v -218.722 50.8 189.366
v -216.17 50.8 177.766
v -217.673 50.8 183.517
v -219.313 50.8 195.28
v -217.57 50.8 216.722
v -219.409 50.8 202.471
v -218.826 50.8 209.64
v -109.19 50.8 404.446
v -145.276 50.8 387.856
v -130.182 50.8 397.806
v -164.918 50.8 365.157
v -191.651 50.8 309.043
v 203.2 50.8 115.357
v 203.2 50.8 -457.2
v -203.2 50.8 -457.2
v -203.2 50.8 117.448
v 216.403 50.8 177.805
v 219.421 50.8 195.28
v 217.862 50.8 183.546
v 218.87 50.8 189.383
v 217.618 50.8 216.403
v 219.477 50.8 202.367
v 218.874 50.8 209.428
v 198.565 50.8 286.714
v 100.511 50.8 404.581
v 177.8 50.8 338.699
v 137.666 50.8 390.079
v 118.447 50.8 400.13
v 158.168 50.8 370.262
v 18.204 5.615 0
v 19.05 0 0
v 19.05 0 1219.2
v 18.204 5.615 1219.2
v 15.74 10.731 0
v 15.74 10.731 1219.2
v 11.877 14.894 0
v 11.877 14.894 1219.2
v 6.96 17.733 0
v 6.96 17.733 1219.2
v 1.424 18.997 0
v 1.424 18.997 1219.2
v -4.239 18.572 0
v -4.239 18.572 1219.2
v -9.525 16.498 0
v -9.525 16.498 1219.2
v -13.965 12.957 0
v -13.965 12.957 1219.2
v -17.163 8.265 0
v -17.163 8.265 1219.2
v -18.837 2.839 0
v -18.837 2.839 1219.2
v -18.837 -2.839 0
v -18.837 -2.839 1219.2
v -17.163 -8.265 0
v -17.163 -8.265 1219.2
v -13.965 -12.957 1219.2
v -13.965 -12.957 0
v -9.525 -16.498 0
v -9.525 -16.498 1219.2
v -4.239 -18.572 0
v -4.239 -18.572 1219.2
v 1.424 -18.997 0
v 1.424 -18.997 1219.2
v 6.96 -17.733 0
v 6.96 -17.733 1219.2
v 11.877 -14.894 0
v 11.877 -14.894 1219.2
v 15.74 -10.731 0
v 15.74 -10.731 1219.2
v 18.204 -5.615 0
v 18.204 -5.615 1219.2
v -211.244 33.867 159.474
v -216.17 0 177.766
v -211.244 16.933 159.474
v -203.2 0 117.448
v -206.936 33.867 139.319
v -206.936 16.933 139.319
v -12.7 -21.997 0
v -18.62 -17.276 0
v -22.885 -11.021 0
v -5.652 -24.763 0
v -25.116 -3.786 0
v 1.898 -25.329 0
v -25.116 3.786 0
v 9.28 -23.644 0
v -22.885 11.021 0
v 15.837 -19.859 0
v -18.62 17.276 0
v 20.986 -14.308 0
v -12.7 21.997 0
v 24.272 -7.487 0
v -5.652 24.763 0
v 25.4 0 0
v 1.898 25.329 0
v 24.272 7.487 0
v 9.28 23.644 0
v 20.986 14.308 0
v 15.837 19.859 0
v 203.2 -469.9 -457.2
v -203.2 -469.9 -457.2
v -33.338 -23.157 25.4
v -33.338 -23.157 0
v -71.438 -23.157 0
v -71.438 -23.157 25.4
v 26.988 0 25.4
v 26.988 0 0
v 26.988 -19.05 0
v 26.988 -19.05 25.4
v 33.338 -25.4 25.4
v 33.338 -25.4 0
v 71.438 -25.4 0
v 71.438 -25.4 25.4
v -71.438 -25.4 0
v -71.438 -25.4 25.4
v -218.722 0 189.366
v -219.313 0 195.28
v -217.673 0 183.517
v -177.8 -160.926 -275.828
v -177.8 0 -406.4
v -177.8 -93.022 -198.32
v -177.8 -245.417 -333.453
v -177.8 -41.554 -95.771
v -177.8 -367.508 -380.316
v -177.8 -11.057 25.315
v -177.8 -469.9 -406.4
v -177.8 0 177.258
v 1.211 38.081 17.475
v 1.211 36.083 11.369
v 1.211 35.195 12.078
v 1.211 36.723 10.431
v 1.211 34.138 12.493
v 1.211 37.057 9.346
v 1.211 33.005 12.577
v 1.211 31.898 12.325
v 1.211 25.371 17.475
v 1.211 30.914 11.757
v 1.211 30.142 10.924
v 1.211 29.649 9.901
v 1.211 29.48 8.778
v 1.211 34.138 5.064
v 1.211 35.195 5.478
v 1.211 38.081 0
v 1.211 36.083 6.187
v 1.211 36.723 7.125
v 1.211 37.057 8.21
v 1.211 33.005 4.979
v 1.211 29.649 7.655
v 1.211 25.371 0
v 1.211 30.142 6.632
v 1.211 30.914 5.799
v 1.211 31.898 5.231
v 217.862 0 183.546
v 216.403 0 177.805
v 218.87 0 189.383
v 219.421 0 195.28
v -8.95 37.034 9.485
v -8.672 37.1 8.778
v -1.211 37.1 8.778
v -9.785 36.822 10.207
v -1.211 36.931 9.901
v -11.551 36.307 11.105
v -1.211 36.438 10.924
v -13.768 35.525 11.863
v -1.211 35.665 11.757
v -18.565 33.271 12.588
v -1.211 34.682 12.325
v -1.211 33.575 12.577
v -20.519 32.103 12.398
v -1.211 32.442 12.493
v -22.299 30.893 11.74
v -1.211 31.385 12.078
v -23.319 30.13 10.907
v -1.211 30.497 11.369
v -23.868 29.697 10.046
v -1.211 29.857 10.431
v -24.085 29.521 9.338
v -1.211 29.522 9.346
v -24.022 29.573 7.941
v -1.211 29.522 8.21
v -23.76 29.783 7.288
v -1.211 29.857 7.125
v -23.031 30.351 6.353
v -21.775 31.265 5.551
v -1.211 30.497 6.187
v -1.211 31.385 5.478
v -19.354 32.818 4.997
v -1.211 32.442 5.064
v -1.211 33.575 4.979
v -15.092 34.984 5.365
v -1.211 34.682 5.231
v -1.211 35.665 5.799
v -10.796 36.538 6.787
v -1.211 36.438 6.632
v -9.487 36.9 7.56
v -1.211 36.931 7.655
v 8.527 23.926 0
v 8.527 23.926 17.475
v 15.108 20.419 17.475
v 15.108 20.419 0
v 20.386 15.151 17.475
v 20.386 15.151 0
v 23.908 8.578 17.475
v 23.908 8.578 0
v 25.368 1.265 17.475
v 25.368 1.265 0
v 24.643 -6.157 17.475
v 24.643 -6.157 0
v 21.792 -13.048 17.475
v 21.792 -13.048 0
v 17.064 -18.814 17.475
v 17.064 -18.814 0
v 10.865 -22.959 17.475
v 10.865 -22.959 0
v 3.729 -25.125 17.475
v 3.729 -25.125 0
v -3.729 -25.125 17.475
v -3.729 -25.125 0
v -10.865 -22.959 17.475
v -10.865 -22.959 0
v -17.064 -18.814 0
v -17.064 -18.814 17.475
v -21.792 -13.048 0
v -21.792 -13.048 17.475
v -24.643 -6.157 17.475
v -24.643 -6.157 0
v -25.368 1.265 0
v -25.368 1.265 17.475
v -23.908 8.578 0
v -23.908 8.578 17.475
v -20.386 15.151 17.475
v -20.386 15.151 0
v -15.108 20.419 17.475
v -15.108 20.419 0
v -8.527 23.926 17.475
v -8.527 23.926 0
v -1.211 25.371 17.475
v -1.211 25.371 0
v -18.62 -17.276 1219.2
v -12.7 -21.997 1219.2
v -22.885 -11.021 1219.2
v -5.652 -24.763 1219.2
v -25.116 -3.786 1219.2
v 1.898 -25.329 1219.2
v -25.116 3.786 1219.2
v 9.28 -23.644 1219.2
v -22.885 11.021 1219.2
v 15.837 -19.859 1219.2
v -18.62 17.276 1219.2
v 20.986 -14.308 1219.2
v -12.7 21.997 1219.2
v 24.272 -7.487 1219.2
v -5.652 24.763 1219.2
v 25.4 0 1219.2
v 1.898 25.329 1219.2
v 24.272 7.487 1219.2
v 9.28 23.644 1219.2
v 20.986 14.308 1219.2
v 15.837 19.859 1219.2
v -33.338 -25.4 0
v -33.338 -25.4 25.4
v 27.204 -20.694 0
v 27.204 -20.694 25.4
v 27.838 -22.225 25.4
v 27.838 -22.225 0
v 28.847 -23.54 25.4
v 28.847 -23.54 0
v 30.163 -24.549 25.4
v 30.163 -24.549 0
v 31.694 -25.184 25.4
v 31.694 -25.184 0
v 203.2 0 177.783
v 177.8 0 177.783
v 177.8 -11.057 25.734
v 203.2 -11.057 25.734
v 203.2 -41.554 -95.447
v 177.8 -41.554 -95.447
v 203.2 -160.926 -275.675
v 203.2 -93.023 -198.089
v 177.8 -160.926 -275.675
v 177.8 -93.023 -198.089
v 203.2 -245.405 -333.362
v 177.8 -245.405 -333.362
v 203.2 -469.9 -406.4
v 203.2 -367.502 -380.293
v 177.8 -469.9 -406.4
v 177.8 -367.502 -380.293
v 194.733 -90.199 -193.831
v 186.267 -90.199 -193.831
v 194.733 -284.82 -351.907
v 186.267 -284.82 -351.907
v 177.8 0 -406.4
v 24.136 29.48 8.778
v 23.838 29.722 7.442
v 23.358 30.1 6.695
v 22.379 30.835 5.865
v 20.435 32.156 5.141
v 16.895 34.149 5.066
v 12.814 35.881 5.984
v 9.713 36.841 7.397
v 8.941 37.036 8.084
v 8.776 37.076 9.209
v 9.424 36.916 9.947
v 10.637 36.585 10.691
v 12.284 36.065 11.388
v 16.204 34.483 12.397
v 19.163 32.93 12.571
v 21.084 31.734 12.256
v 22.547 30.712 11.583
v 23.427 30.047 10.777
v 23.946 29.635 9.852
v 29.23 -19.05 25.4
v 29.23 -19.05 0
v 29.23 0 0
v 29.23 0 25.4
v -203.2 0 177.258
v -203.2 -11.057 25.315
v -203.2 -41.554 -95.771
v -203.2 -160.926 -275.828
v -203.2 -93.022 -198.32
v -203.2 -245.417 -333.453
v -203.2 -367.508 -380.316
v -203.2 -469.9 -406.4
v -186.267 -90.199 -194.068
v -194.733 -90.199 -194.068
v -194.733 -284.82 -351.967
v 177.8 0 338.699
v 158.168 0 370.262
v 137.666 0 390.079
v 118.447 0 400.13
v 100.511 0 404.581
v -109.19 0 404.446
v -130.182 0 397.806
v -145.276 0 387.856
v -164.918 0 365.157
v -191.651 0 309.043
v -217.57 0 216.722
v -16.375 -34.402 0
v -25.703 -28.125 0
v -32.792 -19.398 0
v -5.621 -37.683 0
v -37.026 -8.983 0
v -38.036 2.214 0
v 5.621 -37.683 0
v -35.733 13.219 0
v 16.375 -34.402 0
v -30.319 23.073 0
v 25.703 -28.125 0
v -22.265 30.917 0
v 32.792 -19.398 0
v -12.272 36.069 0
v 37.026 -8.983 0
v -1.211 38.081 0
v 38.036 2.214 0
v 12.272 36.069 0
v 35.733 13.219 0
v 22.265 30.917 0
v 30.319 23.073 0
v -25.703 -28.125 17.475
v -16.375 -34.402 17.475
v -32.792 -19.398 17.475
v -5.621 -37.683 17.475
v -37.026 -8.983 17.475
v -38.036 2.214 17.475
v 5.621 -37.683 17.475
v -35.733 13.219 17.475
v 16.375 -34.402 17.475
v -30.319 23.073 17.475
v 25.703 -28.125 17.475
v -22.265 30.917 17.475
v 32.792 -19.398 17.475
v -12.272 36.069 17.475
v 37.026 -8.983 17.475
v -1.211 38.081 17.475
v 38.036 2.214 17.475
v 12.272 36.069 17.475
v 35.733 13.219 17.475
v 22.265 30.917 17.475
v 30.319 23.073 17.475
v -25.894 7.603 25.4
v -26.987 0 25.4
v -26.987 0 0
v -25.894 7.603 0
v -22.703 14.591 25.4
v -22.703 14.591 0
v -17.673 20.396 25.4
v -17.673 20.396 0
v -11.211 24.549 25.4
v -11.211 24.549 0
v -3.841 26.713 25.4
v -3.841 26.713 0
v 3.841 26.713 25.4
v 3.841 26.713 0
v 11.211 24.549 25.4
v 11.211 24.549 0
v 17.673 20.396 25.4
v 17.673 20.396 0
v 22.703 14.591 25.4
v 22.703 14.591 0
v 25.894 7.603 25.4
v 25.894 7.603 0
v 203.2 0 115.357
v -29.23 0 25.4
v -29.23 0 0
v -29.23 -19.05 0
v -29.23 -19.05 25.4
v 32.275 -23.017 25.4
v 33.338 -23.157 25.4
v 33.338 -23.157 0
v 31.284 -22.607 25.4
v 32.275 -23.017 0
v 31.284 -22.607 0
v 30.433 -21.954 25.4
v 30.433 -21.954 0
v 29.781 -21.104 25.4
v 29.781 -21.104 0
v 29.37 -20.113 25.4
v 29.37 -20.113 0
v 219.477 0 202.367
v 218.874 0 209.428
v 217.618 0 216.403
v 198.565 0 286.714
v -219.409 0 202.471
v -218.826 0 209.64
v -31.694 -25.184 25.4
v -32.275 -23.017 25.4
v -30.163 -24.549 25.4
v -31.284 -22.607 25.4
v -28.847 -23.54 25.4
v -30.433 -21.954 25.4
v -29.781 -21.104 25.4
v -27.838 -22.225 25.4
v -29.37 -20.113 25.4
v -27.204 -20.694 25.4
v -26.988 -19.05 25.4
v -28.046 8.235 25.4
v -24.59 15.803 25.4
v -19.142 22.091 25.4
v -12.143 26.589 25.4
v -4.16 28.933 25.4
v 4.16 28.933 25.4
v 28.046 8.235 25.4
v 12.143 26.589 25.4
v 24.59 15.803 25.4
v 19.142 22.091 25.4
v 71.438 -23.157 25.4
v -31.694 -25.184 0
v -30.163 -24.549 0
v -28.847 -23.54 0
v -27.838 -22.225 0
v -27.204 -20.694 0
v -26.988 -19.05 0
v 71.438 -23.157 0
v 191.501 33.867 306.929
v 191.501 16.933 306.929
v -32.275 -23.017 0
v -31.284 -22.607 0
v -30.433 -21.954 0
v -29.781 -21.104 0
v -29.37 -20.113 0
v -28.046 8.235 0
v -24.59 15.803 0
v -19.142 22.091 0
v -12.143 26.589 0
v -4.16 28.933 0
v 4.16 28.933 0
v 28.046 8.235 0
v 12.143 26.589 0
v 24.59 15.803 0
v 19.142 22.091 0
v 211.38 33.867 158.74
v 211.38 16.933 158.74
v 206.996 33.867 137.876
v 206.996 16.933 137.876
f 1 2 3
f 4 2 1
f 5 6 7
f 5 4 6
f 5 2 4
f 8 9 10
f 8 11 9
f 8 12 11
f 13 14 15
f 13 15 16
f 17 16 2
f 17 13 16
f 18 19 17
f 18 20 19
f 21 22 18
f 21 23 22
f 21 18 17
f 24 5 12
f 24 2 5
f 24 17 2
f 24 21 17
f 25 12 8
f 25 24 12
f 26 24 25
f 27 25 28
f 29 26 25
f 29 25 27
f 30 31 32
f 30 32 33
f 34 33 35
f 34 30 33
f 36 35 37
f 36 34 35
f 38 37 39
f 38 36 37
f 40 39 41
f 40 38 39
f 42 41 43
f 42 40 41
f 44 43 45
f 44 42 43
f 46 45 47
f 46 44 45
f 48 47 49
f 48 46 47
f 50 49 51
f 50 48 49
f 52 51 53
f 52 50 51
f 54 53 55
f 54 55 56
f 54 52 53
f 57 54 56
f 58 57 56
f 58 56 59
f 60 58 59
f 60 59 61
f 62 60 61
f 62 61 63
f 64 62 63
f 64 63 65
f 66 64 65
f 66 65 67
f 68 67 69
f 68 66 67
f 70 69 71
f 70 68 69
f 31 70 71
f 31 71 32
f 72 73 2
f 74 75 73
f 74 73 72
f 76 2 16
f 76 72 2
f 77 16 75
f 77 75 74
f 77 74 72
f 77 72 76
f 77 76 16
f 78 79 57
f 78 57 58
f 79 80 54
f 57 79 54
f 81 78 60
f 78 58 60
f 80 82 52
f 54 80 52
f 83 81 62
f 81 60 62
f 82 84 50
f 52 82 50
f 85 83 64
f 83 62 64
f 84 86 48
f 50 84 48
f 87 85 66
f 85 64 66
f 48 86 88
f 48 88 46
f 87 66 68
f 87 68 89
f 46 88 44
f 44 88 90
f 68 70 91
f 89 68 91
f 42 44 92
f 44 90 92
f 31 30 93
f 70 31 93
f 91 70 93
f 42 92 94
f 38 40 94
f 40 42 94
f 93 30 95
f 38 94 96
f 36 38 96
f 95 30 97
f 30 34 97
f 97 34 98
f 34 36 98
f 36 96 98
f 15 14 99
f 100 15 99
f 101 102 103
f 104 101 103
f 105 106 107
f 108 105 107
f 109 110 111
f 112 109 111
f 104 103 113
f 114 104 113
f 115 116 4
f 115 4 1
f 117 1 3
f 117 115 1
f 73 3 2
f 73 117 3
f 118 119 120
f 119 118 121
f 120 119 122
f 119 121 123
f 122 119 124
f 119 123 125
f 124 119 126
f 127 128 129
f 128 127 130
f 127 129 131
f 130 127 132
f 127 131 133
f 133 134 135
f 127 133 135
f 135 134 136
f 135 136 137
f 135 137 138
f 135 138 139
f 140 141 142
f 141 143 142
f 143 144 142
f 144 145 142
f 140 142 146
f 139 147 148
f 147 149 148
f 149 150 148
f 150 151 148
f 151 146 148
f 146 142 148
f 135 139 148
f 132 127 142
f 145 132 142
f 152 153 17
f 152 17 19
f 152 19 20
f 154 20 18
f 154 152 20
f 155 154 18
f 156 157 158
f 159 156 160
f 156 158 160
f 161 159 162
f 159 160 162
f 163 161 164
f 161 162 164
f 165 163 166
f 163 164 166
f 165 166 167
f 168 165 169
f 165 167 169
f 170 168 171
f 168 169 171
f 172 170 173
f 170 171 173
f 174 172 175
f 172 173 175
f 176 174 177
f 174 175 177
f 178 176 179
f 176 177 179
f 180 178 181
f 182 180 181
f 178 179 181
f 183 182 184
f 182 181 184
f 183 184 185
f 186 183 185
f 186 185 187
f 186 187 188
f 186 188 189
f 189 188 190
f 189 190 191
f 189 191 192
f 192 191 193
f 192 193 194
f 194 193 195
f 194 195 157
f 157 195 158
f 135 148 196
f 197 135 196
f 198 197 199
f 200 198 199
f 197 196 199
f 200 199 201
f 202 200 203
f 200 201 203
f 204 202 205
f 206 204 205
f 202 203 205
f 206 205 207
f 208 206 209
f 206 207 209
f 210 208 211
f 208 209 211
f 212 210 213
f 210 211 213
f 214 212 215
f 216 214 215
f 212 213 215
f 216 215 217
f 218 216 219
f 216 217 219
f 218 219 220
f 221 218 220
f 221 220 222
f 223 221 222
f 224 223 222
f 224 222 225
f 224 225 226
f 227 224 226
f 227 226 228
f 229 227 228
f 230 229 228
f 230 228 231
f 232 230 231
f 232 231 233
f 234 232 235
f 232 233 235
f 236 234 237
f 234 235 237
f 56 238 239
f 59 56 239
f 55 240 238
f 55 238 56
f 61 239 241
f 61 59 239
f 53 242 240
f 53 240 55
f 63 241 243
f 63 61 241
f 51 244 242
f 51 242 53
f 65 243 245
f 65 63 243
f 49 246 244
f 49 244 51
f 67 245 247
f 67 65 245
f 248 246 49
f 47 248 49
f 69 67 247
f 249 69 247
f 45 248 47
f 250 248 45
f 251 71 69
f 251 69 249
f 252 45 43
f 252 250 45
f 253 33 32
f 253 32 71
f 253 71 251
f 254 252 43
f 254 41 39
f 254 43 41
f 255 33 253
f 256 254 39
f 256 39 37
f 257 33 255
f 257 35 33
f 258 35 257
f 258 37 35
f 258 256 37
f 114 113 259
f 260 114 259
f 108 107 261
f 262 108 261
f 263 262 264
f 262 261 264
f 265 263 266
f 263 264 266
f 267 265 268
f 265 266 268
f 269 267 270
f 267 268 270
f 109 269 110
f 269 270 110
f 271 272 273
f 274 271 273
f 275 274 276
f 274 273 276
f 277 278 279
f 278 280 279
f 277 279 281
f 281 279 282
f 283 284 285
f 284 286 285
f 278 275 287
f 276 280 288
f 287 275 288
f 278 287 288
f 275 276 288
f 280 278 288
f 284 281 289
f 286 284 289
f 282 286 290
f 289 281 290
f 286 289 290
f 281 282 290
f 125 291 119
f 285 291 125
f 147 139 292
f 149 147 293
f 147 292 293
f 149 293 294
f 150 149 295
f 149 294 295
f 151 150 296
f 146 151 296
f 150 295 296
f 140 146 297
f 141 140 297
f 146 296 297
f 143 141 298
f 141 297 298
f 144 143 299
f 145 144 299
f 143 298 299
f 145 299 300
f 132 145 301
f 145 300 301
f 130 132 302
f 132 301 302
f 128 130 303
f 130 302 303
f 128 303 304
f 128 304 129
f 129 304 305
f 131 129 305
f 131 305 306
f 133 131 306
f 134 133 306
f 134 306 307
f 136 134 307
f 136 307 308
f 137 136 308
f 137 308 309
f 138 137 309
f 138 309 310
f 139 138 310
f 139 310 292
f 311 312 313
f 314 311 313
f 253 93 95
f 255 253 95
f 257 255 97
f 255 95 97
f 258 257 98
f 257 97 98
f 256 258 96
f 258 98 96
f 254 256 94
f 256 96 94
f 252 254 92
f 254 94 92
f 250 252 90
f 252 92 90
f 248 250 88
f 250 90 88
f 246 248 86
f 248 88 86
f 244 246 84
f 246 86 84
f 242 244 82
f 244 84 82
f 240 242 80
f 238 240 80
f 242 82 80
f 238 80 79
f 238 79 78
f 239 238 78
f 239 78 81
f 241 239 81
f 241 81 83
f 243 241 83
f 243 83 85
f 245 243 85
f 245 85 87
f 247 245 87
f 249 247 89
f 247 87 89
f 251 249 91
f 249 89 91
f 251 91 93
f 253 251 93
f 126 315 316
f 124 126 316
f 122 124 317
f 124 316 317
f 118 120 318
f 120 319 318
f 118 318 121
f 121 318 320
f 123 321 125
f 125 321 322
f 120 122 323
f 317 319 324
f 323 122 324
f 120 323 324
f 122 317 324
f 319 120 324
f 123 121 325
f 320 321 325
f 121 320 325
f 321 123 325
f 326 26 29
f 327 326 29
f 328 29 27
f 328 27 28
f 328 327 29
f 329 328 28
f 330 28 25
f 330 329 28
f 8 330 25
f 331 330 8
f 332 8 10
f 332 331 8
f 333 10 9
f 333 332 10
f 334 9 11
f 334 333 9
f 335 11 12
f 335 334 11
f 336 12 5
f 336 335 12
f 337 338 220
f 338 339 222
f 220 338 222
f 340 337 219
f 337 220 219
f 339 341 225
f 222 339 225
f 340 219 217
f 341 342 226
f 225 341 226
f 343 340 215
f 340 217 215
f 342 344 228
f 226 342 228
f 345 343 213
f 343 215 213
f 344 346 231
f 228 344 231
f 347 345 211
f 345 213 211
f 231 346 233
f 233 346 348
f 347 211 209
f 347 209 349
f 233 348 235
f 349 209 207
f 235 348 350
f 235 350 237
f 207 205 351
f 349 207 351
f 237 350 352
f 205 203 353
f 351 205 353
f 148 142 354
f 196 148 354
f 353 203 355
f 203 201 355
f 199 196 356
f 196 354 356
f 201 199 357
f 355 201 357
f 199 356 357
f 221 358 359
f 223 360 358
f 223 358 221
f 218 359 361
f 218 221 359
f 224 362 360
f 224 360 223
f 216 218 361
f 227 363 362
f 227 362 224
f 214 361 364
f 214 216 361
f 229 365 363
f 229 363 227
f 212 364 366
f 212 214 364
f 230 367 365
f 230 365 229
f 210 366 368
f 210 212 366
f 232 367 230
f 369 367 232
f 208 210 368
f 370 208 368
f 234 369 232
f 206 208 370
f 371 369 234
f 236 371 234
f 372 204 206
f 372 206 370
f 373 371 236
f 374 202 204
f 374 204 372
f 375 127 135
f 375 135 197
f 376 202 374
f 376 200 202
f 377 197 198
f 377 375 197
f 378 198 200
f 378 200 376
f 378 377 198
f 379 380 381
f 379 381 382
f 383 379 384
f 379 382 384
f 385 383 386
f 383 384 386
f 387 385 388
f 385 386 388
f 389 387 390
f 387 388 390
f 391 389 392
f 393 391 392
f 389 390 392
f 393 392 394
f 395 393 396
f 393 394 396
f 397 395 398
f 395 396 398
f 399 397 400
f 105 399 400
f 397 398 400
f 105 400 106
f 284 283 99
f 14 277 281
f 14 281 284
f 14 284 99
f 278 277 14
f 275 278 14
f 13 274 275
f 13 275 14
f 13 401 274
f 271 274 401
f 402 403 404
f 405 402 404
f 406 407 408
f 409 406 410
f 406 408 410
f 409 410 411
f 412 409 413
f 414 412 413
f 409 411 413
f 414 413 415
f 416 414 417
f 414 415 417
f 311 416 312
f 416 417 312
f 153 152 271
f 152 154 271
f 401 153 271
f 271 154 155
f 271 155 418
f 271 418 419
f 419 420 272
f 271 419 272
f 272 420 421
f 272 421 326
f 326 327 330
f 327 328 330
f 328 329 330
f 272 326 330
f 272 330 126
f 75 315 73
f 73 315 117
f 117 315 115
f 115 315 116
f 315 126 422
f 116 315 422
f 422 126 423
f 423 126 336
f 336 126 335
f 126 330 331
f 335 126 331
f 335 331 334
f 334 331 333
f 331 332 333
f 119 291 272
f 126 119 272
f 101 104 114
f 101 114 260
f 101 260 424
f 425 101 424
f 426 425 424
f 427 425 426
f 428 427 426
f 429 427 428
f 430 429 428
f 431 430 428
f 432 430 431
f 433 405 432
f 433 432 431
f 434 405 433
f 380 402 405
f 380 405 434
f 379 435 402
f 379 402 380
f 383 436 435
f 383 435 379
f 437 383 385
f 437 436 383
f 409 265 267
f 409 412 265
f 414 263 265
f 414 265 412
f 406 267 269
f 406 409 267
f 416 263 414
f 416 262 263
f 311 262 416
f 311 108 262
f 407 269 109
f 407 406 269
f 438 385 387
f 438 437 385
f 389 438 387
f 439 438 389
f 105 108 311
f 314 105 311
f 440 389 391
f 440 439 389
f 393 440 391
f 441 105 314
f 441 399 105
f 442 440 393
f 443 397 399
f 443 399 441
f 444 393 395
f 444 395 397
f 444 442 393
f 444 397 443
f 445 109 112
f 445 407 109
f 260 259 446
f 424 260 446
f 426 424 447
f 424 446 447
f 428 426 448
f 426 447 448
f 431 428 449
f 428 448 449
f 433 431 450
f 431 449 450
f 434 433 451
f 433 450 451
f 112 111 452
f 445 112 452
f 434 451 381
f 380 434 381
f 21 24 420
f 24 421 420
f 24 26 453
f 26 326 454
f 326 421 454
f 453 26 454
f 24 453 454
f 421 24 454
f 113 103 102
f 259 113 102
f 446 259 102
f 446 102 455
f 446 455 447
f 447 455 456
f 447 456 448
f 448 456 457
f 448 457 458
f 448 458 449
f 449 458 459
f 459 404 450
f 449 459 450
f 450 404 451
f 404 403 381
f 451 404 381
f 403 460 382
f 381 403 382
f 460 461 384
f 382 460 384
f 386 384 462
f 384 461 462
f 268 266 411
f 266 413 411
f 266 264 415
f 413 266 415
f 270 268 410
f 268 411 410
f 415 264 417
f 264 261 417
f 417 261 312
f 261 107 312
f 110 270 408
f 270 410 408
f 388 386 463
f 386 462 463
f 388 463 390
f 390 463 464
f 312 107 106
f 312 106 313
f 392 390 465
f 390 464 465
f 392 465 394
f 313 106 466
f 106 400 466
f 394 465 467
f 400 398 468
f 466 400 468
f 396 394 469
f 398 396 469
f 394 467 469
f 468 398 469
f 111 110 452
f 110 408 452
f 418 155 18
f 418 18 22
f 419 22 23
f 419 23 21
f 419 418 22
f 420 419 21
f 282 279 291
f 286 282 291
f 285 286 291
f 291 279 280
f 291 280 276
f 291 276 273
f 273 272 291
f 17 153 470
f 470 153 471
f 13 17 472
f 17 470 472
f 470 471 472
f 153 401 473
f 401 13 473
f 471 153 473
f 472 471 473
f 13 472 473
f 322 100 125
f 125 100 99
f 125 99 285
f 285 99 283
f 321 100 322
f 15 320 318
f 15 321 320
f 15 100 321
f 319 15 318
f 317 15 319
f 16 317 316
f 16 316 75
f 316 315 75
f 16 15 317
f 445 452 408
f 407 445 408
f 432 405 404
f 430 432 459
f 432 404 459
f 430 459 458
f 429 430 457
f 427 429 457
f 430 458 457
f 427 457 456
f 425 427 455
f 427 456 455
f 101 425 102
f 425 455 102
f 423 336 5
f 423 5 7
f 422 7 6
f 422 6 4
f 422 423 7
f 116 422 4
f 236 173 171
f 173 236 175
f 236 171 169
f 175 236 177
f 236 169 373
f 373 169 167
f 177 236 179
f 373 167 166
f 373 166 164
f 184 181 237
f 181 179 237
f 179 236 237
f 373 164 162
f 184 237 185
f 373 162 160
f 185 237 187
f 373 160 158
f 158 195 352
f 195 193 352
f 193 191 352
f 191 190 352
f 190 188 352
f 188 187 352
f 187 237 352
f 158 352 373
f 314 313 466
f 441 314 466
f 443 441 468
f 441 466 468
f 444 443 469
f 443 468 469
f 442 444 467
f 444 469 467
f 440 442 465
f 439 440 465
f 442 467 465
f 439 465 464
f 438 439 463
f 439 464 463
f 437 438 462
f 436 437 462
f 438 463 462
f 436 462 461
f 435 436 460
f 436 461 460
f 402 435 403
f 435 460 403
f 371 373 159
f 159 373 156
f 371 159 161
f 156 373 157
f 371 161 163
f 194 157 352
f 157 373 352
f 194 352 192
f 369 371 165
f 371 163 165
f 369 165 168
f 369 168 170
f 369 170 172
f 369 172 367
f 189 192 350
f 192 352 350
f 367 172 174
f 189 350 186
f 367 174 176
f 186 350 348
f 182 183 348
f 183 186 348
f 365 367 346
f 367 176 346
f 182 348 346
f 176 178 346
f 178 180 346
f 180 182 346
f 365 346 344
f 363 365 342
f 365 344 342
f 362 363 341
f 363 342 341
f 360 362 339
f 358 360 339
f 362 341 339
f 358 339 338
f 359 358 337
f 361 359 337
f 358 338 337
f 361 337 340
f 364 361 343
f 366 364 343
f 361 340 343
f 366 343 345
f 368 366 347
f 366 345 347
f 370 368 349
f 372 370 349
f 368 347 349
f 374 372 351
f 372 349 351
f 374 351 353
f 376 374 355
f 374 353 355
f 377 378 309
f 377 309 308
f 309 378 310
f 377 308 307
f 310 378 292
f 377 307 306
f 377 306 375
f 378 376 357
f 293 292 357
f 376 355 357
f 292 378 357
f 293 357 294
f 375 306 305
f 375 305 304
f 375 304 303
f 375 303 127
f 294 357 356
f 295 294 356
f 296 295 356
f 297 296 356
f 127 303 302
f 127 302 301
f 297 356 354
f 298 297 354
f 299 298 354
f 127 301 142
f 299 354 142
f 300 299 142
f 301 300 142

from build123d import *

# Parameters (mm, degrees)
F0_R      = 25.4
F0_R_2    = 19.05
F1_DEPTH  = 1219.2
F2_DEPTH  = 25.4
F4_DEPTH  = 17.4752
F6_D      = 7.62
F6_DEPTH  = 38.101
F7_D      = 7.62
F8_W      = 355.6
F8_H      = 50.8
F9_DEPTH  = 50.8
F11_DEPTH = 469.9
F12_DEPTH = 25.4
F14_DEPTH = 25.4
F15_DEPTH = 25.4


with BuildPart() as f1:
    # F0 (on Top) → F1 (new body)
    with BuildSketch(Plane.XY):
        Circle(F0_R)
        Circle(F0_R_2, mode=Mode.SUBTRACT)
    extrude(amount=F1_DEPTH)


with BuildPart() as f2:
    # F0 (on Top) → F2 (new body)
    with BuildSketch(Plane.XY):
        with BuildLine():
            Line((-26.9875, -19.05), (-26.9875, 0))
            ThreePointArc((-26.9875, 0), (0, 26.9875), (26.9875, 0))
            Line((26.9875, 0), (26.9875, -19.05))
            ThreePointArc((26.9875, -19.05), (28.8473719395, -23.5401280605), (33.3375, -25.4))
            Line((33.3375, -25.4), (71.4375, -25.4))
            Line((71.4375, -25.4), (71.4375, -23.1570992619))
            Line((71.4375, -23.1570992619), (33.3375, -23.1570992619))
            ThreePointArc((33.3375, -23.1570992619), (30.4333422609, -21.9541577391), (29.2304007381, -19.05))
            Line((29.2304007381, -19.05), (29.2304007381, 0))
            ThreePointArc((29.2304007381, 0), (0, 29.2304007381), (-29.2304007381, 0))
            Line((-29.2304007381, 0), (-29.2304007381, -19.05))
            ThreePointArc((-29.2304007381, -19.05), (-30.4333422609, -21.9541577391), (-33.3375, -23.1570992619))
            Line((-33.3375, -23.1570992619), (-71.4375, -23.1570992619))
            Line((-71.4375, -23.1570992619), (-71.4375, -25.4))
            Line((-71.4375, -25.4), (-33.3375, -25.4))
            ThreePointArc((-33.3375, -25.4), (-28.8473719395, -23.5401280605), (-26.9875, -19.05))
        make_face()
    extrude(amount=F2_DEPTH)


with BuildPart() as f4:
    # F3 (on Top) → F4 (new body)
    with BuildSketch(Plane.XY):
        with BuildLine():
            Line((-1.210663635, 25.3711311053), (-1.210663635, 38.0807601495))
            ThreePointArc((-1.210663635, 38.0807601495), (0, -38.1), (1.210663635, 38.0807601495))
            Line((1.210663635, 38.0807601495), (1.210663635, 25.3711311053))
            ThreePointArc((1.210663635, 25.3711311053), (0, -25.4), (-1.210663635, 25.3711311053))
        make_face()
    extrude(amount=F4_DEPTH)

    # F6 (through all, one way)
    with BuildSketch(Plane.YZ):
        with Locations((33.2899410278, 8.7780257373)):
            Circle(F6_D / 2)
    extrude(amount=-F6_DEPTH, mode=Mode.SUBTRACT)

    # F7 (through all)
    with Locations(Plane(origin=(0, 0, 0), x_dir=(0, 1, 0), z_dir=(-1, 0, 0))):
        with Locations((33.2899410278, -8.7780257373)):
            Hole(F7_D / 2)


with BuildPart() as f9:
    # F8 (on Front) → F9 (new body)
    with BuildSketch(Plane.XZ):
        with BuildLine():
            add(Edge.make_bspline(
                [(-10.5840112569, 406.4), (14.3579992132, 406.4), (84.774969433, 406.4), (143.8927068177, 406.4), (177.8, 338.6991968772)],
                knots=[0.4890074401, 0.4890074401, 0.4890074401, 0.4890074401, 0.6309879631, 0.8835658569, 0.8835658569, 0.8835658569, 0.8835658569], degree=3))
            add(Edge.make_bspline(
                [(-177.8, 342.347117997), (-146.667200487, 406.4), (-96.3951234553, 406.4), (-32.4144817487, 406.4), (-10.5840112569, 406.4)],
                knots=[0.1196529721, 0.1196529721, 0.1196529721, 0.1196529721, 0.364739125, 0.4890074401, 0.4890074401, 0.4890074401, 0.4890074401], degree=3))
            Line((-177.8, 342.347117997), (-177.8, 195.2799856663))
            Line((-177.8, 195.2799856663), (0, 195.2799856663))
            Line((0, 195.2799856663), (177.8, 195.2799856663))
            Line((177.8, 195.2799856663), (177.8, 338.6991968772))
        make_face()
        with BuildLine():
            add(Edge.make_bspline(
                [(177.8, 338.6991968772), (191.7201419538, 310.905625011), (204.9767238239, 271.7018098175), (217.617713139, 216.4034432339)],
                knots=[0.8835658569, 0.8835658569, 0.8835658569, 0.8835658569, 0.987258007, 0.987258007, 0.987258007, 0.987258007], degree=3))
            Line((177.8, 338.6991968772), (177.8, 195.2799856663))
            Line((177.8, 195.2799856663), (219.4212105721, 195.2799856663))
            ThreePointArc((219.4212105721, 195.2799856663), (219.2576697661, 205.9047418246), (217.617713139, 216.4034432339))
        make_face()
        with BuildLine():
            Line((-177.8, 195.2799856663), (-177.8, 342.347117997))
            add(Edge.make_bspline(
                [(-217.5700060395, 216.7215468508), (-204.5258308337, 274.3135632336), (-191.3744497579, 314.4189315762), (-177.8, 342.347117997)],
                knots=[0.0127910862, 0.0127910862, 0.0127910862, 0.0127910862, 0.1196529721, 0.1196529721, 0.1196529721, 0.1196529721], degree=3))
            ThreePointArc((-217.5700060395, 216.7215468508), (-219.2018900162, 206.0625792295), (-219.3128499865, 195.2799856663))
            Line((-219.3128499865, 195.2799856663), (-177.8, 195.2799856663))
        make_face()
        with BuildLine():
            Line((219.4212105721, 195.2799856663), (177.8, 195.2799856663))
            Line((177.8, 195.2799856663), (177.8, -406.4))
            add(Edge.make_bspline(
                [(216.4032871844, 177.8052482541), (179.1187861214, 51.7780463516), (191.9249839566, -215.2026964108), (177.8, -406.4)],
                knots=[28.1646192279, 28.1646192279, 28.1646192279, 28.1646192279, 603.319656278, 603.319656278, 603.319656278, 603.319656278], degree=3))
            ThreePointArc((216.4032871844, 177.8052482541), (218.4223260439, 186.454525576), (219.4212105721, 195.2799856663))
        make_face()
        Polygon((177.8, -406.4), (177.8, 195.2799856663), (0, 195.2799856663), (-177.8, 195.2799856663), (-177.8, -406.4), align=None)
        with BuildLine():
            Line((-177.8, -406.4), (-177.8, 195.2799856663))
            Line((-177.8, 195.2799856663), (-219.3128499865, 195.2799856663))
            ThreePointArc((-219.3128499865, 195.2799856663), (-218.2545301806, 186.4311737852), (-216.1703176559, 177.76644236))
            add(Edge.make_bspline(
                [(-216.1703176559, 177.76644236), (-179.1721643238, 55.8179762585), (-191.8954816103, -215.602043346), (-177.8, -406.4)],
                knots=[29.3659248791, 29.3659248791, 29.3659248791, 29.3659248791, 603.319656278, 603.319656278, 603.319656278, 603.319656278], degree=3))
        make_face()
        with Locations((0, -431.8)):
            Rectangle(F8_W, F8_H)
    extrude(amount=-F9_DEPTH)

    # F8 (on Front) → F11 (join)
    with BuildSketch(Plane.XZ):
        with Locations((0, -431.8)):
            Rectangle(F8_W, F8_H)
    extrude(amount=F11_DEPTH)

    # F12 (add, symmetric): faces of the model
    f12_faces = [f9.faces().sort_by_distance(p)[0] for p in [
        (177.8, -209.55, -431.8),
        (-177.8, -209.55, -431.8),
    ]]
    extrude(f12_faces, amount=F12_DEPTH, both=True, dir=(1, 0, 0))

    # F10 (on face) → F14 (join)
    with BuildSketch(Plane.YZ.offset(177.8)):
        with BuildLine():
            Line((50.8, 177.7829378843), (0, 177.7829378843))
            add(Edge.make_bspline(
                [(0, 177.7829378843), (0, -337.2519960899), (-327.5773703098, -367.0474041939), (-469.9, -406.4)],
                knots=[0, 0, 0, 0, 749.717089918, 749.717089918, 749.717089918, 749.717089918], degree=3))
            Line((-469.9, -406.4), (50.8, -406.4))
            Line((50.8, -406.4), (50.8, 177.7829378843))
        make_face()
    extrude(amount=F14_DEPTH)

    # F13 (on face) → F15 (join)
    with BuildSketch(Plane(origin=(-203.2, 0, 0), x_dir=(0, -1, 0), z_dir=(-1, 0, 0))):
        with BuildLine():
            Line((0, 177.2581189871), (-50.8, 177.2581189871))
            Line((-50.8, 177.2581189871), (-50.8, -406.4))
            Line((-50.8, -406.4), (469.9, -406.4))
            add(Edge.make_bspline(
                [(0, 177.2581189871), (0, -337.4345749617), (327.5773703098, -367.0474041939), (469.9, -406.4)],
                knots=[0, 0, 0, 0, 749.3082208674, 749.3082208674, 749.3082208674, 749.3082208674], degree=3))
        make_face()
    extrude(amount=-F15_DEPTH)


solid = Compound([f1.part, f2.part, f4.part, f9.part])
